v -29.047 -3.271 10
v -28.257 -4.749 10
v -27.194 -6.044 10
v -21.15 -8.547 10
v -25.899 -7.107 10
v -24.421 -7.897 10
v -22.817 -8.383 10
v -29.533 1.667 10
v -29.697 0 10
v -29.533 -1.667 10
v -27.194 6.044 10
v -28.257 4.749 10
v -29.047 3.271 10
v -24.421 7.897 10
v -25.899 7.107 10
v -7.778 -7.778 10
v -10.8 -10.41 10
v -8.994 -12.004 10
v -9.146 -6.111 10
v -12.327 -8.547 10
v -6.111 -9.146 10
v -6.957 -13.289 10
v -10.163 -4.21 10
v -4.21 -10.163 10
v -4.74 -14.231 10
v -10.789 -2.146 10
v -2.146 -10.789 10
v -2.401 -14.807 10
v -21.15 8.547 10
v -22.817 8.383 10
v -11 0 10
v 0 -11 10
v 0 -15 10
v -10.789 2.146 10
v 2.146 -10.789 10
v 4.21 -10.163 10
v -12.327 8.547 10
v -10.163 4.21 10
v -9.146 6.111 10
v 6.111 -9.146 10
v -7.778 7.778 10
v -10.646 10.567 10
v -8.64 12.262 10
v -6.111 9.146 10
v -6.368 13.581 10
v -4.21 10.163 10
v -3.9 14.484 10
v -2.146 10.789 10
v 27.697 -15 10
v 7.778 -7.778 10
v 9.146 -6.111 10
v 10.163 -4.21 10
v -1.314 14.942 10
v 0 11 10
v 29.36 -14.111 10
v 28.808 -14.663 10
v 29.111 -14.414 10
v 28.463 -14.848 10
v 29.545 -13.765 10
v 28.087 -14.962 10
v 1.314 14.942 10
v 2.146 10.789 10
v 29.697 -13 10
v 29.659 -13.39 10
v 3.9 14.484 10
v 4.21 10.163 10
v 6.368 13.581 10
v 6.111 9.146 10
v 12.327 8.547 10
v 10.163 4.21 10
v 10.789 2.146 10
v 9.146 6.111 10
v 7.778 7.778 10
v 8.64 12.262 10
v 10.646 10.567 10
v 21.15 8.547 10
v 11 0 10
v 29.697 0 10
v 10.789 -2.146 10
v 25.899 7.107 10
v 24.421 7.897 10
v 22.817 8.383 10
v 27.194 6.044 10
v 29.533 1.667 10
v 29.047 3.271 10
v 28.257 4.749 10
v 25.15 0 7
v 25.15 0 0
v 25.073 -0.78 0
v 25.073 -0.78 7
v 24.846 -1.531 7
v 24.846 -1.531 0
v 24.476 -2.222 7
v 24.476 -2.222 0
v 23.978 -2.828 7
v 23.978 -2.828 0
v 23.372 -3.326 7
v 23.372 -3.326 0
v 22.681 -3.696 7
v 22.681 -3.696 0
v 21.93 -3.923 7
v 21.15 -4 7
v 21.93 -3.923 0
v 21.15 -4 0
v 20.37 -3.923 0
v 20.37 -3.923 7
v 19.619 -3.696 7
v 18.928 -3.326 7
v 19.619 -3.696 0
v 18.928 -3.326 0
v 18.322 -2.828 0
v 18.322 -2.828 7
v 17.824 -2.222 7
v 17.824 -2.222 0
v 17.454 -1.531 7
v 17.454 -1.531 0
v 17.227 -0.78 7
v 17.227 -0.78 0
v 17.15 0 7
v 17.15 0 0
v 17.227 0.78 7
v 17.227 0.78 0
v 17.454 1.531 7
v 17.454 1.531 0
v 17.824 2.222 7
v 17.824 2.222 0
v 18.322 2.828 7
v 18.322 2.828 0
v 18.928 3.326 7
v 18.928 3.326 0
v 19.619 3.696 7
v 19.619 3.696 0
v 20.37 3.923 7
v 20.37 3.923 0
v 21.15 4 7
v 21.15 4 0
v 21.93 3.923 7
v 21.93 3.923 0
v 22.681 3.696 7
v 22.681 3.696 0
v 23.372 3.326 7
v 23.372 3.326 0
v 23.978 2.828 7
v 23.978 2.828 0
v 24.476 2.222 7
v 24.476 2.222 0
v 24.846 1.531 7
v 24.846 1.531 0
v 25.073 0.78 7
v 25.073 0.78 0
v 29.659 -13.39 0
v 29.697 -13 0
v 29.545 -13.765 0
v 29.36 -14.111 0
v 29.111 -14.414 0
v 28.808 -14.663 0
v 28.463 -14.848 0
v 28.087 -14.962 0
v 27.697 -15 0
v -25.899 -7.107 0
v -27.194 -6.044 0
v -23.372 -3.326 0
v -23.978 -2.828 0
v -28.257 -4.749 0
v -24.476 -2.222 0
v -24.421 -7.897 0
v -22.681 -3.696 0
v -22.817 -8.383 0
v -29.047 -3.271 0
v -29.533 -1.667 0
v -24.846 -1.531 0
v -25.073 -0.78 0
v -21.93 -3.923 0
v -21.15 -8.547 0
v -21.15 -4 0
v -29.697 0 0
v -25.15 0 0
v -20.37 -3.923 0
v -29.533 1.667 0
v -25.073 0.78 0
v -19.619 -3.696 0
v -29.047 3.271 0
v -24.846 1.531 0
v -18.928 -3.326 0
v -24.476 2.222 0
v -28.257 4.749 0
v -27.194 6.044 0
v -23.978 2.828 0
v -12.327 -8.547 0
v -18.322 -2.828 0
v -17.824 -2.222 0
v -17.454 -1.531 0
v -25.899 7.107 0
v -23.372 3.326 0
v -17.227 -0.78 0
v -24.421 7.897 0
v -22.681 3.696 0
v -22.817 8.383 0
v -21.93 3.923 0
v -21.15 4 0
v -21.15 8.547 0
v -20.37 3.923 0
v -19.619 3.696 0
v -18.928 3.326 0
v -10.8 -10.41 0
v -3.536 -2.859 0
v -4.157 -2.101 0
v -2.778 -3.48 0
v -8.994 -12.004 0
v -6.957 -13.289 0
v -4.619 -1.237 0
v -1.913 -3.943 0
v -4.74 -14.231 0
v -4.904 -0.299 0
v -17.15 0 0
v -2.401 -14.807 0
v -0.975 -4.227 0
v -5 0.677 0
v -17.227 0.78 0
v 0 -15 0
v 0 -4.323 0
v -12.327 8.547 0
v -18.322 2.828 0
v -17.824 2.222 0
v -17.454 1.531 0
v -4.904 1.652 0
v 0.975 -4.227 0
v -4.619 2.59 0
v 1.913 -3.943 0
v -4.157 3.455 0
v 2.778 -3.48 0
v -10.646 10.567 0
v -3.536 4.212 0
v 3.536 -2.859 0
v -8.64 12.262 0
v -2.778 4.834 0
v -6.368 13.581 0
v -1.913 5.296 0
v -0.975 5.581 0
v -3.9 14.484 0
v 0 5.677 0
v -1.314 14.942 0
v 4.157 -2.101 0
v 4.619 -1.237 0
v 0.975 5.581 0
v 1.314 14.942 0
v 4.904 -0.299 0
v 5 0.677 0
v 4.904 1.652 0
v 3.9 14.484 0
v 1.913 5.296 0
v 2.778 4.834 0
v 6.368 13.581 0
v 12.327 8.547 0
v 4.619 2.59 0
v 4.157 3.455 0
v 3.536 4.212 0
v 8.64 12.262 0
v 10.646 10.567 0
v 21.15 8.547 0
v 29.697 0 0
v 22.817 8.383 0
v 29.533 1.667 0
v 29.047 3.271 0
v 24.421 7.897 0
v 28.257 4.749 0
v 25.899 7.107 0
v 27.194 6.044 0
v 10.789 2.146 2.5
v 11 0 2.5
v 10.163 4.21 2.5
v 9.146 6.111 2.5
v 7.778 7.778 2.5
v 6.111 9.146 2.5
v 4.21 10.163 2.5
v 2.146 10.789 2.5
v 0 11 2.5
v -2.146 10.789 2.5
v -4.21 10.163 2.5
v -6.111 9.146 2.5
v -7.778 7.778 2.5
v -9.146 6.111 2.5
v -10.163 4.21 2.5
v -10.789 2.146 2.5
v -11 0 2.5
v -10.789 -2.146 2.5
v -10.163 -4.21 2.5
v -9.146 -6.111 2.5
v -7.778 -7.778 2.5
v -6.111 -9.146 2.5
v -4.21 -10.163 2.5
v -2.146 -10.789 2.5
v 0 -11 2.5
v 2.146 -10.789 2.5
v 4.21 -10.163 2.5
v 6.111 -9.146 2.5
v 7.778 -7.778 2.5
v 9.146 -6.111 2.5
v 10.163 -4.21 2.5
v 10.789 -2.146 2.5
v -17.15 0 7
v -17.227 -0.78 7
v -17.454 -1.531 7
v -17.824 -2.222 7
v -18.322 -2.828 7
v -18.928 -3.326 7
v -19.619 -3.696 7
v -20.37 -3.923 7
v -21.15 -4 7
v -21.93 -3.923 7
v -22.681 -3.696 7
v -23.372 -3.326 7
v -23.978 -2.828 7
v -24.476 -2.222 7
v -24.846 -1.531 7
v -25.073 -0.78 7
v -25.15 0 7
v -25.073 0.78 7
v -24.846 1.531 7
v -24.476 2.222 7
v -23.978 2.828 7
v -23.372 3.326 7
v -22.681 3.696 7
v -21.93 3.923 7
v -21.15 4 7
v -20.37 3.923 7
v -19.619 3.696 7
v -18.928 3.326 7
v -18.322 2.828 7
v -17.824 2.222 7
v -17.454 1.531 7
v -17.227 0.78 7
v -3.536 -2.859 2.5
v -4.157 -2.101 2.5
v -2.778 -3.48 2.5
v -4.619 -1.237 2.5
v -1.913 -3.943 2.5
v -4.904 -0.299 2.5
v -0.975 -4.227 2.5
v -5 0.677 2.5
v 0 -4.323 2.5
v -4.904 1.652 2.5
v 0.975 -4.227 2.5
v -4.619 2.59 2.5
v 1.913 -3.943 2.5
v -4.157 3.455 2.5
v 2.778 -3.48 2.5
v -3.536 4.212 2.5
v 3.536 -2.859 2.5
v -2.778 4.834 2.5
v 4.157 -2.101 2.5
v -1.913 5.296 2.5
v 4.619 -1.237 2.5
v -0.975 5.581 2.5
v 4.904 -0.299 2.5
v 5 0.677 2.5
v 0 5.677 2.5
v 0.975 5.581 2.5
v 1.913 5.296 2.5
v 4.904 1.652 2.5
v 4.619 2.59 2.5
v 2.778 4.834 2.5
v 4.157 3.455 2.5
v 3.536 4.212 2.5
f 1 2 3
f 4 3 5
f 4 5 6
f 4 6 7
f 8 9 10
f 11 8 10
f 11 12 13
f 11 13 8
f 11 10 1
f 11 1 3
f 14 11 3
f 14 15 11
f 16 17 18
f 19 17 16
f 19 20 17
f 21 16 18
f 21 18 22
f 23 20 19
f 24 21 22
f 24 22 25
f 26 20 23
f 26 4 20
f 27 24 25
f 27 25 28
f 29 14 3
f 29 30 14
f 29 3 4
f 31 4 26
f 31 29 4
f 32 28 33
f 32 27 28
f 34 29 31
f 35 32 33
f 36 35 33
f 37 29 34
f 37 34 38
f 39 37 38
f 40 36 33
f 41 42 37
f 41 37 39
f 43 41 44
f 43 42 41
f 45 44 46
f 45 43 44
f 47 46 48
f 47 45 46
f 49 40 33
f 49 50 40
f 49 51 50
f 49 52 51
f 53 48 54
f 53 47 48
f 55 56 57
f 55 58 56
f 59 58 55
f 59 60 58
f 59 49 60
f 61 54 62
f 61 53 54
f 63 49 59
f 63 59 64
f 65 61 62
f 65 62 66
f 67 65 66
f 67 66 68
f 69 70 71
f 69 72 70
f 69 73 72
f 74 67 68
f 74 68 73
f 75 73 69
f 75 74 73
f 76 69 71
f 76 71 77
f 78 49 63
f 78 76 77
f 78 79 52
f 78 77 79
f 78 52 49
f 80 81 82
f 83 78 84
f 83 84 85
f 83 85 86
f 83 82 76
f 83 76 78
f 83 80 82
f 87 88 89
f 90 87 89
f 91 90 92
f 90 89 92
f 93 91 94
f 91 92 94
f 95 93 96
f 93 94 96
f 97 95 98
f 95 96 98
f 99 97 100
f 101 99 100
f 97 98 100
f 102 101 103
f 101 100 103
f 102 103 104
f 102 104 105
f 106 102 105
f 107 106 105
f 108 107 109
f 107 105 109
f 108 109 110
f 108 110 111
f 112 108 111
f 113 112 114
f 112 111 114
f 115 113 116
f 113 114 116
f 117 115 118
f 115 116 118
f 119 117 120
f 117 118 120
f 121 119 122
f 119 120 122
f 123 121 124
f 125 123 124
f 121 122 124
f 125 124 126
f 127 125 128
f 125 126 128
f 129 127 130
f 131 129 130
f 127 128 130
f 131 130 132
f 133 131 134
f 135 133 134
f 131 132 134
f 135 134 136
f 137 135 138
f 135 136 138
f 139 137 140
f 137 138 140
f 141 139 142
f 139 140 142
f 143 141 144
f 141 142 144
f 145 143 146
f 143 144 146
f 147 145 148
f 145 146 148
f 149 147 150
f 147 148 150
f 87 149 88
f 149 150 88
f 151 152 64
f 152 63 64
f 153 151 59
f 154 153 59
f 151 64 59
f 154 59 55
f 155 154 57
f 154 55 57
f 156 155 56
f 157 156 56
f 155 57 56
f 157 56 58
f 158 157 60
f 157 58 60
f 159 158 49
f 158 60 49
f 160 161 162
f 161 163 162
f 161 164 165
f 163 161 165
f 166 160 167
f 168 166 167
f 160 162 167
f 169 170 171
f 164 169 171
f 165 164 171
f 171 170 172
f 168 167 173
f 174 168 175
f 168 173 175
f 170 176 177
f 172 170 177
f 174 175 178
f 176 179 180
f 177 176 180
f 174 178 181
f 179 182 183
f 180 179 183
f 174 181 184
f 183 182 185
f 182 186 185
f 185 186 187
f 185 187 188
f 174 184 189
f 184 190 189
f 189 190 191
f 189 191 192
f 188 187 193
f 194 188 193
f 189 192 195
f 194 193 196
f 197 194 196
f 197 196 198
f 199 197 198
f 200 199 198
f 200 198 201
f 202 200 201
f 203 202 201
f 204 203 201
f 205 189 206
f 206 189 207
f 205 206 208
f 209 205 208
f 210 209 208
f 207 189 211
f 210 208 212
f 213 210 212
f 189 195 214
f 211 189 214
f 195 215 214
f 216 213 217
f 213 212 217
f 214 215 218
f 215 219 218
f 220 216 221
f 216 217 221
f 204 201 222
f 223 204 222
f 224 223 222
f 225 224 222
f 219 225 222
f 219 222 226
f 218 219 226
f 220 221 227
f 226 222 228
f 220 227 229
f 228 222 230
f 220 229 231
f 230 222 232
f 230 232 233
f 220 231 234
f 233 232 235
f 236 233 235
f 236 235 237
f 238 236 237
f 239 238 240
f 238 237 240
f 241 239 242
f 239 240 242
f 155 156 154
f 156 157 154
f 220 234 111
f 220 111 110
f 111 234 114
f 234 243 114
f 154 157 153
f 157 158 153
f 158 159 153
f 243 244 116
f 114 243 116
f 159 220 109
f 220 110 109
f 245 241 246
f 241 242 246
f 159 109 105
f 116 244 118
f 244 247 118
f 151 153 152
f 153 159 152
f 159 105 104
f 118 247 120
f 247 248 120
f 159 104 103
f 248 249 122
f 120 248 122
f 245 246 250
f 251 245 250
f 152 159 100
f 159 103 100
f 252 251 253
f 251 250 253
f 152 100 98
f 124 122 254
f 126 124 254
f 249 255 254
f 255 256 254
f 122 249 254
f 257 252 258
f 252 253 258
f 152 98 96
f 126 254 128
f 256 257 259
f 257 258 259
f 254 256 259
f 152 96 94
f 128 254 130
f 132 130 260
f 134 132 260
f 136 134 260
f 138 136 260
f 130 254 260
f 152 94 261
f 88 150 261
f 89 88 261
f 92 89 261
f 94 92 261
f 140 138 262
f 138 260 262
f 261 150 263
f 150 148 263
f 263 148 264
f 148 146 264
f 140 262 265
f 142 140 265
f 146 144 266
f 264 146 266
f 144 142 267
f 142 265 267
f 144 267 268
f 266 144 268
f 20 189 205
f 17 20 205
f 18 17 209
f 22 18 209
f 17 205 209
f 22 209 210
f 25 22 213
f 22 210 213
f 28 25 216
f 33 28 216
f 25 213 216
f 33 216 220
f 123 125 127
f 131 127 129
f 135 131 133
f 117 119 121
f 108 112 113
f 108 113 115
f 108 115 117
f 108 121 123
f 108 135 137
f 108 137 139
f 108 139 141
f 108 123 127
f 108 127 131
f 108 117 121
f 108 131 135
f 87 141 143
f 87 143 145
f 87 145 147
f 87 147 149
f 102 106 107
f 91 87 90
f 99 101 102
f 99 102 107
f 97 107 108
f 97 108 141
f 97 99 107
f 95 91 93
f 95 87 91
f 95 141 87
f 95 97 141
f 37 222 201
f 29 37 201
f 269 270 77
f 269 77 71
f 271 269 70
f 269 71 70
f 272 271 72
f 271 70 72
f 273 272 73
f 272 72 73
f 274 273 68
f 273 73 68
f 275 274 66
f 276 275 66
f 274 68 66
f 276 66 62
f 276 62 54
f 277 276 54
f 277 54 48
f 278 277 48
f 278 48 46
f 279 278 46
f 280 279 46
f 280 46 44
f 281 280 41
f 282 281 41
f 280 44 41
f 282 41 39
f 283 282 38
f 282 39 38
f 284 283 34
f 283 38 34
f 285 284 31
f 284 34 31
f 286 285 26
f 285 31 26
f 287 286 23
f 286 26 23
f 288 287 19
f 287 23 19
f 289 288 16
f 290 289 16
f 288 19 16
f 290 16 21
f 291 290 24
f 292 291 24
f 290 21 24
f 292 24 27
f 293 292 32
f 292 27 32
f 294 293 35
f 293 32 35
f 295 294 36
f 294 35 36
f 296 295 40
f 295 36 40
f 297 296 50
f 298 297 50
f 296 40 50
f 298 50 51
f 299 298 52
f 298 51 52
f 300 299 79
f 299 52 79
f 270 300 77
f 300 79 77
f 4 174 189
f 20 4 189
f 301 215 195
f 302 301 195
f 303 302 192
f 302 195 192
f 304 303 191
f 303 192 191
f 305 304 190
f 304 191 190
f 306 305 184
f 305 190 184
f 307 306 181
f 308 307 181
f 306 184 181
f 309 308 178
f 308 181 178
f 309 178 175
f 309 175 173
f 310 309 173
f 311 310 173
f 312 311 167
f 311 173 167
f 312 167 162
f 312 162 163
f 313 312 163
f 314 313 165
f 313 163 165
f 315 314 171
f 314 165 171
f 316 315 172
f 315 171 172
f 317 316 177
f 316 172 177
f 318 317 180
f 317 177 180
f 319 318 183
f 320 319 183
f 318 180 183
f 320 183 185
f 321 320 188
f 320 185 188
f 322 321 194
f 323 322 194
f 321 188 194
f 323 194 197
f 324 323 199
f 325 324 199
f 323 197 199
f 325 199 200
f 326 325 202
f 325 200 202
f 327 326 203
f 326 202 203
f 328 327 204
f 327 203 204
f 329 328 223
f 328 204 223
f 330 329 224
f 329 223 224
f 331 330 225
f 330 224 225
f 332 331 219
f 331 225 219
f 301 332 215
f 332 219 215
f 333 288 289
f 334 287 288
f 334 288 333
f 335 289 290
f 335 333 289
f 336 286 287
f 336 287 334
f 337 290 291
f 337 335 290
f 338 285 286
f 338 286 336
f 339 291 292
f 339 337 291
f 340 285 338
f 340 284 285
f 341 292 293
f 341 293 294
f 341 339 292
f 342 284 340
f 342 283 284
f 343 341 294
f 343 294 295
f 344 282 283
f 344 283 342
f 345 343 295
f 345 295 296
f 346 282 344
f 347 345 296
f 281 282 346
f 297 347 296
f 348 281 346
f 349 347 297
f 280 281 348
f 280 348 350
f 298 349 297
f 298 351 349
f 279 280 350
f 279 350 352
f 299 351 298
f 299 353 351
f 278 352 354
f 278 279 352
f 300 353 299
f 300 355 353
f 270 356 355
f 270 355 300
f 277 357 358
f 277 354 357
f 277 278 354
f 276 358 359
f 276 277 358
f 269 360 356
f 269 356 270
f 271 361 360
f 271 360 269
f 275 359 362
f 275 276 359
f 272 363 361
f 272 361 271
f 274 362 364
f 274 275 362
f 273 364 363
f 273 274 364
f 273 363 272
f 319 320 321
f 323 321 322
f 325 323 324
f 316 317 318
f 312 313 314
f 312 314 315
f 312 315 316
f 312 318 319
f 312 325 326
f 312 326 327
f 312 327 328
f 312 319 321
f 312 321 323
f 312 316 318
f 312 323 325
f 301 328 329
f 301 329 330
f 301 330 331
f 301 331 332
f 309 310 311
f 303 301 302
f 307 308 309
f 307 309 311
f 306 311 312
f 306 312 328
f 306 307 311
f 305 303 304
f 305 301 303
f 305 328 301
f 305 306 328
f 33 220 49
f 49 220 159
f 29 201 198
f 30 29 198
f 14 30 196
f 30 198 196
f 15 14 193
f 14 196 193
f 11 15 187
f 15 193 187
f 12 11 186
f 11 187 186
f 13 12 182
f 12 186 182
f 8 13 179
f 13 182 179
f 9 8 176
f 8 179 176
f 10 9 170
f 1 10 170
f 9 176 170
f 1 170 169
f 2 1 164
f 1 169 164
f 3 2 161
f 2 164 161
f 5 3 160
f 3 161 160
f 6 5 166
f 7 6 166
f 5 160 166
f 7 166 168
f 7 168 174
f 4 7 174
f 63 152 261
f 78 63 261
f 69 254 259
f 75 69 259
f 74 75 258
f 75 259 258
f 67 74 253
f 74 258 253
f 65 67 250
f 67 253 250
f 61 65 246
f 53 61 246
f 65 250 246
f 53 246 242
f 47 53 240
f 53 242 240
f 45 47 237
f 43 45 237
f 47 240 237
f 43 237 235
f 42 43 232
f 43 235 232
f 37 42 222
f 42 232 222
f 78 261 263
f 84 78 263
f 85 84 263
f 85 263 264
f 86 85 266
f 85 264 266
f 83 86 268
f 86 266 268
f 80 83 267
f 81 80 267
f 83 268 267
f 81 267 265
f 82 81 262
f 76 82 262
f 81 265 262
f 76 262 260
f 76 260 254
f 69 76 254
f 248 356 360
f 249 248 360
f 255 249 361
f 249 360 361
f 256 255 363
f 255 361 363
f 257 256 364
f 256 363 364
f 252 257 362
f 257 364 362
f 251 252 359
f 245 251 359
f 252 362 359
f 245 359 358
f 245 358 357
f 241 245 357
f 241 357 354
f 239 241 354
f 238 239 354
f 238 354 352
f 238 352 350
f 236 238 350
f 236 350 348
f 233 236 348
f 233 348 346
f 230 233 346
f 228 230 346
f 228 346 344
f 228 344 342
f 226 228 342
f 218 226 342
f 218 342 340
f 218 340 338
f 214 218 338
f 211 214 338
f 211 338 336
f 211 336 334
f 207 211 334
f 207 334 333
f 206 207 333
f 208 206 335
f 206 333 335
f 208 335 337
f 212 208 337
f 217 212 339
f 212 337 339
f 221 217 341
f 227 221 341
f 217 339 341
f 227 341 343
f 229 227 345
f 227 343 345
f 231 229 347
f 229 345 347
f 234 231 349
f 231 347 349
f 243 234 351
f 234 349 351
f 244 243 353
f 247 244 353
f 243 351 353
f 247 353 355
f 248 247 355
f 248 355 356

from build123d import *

# Parameters (mm, degrees)
F1_DEPTH = 10
F2_R     = 11
F3_DEPTH = 7.5
F4_R     = 4
F5_DEPTH = 7
F6_R     = 5
F7_DEPTH = 25
F8_R     = 2


# Not quite as in the source:
# - a feature names something its author has since deleted; it is built from what else it names


with BuildPart() as f1:
    # F0 (on Top) → F1 (new body)
    with BuildSketch(Plane.XY):
        with BuildLine():
            Line((29.69714, -15), (29.69714, 0))
            ThreePointArc((29.69714, 0), (27.1937406538, 6.0437406538), (21.15, 8.54714))
            Line((21.15, 8.54714), (12.3266539588, 8.54714))
            ThreePointArc((12.3266539588, 8.54714), (0, 15), (-12.3266539588, 8.54714))
            Line((-12.3266539588, 8.54714), (-21.15, 8.54714))
            ThreePointArc((-21.15, 8.54714), (-29.69714, 0), (-21.15, -8.54714))
            Line((-21.15, -8.54714), (-12.3266539588, -8.54714))
            ThreePointArc((-12.3266539588, -8.54714), (-6.9567557094, -13.2892268398), (0, -15))
            Line((0, -15), (29.69714, -15))
        make_face()
    extrude(amount=F1_DEPTH)

    # F2 (on face) → F3 (cut)
    with BuildSketch(Plane.XY.offset(10)):
        Circle(F2_R)
    extrude(amount=-F3_DEPTH, mode=Mode.SUBTRACT)

    # F4 (on face) → F5 (cut)
    with BuildSketch(Plane(origin=(0, 0, 0), x_dir=(1, 0, 0), z_dir=(0, 0, -1))):
        with Locations((-21.15, 0)):
            Circle(F4_R)
        with Locations((21.15, 0)):
            Circle(F4_R)
    extrude(amount=-F5_DEPTH, mode=Mode.SUBTRACT)

    # F6 (on face) → F7 (cut)
    with BuildSketch(Plane.XY.offset(2.5)):
        with Locations((0, 0.6768586167)):
            Circle(F6_R)
    extrude(amount=-F7_DEPTH, mode=Mode.SUBTRACT)

    # F8
    f8_edges = [f1.edges().sort_by_distance(p)[0] for p in [
        (29.69714, -15, 5),
    ]]
    fillet(f8_edges, radius=F8_R)


solid = f1.part
